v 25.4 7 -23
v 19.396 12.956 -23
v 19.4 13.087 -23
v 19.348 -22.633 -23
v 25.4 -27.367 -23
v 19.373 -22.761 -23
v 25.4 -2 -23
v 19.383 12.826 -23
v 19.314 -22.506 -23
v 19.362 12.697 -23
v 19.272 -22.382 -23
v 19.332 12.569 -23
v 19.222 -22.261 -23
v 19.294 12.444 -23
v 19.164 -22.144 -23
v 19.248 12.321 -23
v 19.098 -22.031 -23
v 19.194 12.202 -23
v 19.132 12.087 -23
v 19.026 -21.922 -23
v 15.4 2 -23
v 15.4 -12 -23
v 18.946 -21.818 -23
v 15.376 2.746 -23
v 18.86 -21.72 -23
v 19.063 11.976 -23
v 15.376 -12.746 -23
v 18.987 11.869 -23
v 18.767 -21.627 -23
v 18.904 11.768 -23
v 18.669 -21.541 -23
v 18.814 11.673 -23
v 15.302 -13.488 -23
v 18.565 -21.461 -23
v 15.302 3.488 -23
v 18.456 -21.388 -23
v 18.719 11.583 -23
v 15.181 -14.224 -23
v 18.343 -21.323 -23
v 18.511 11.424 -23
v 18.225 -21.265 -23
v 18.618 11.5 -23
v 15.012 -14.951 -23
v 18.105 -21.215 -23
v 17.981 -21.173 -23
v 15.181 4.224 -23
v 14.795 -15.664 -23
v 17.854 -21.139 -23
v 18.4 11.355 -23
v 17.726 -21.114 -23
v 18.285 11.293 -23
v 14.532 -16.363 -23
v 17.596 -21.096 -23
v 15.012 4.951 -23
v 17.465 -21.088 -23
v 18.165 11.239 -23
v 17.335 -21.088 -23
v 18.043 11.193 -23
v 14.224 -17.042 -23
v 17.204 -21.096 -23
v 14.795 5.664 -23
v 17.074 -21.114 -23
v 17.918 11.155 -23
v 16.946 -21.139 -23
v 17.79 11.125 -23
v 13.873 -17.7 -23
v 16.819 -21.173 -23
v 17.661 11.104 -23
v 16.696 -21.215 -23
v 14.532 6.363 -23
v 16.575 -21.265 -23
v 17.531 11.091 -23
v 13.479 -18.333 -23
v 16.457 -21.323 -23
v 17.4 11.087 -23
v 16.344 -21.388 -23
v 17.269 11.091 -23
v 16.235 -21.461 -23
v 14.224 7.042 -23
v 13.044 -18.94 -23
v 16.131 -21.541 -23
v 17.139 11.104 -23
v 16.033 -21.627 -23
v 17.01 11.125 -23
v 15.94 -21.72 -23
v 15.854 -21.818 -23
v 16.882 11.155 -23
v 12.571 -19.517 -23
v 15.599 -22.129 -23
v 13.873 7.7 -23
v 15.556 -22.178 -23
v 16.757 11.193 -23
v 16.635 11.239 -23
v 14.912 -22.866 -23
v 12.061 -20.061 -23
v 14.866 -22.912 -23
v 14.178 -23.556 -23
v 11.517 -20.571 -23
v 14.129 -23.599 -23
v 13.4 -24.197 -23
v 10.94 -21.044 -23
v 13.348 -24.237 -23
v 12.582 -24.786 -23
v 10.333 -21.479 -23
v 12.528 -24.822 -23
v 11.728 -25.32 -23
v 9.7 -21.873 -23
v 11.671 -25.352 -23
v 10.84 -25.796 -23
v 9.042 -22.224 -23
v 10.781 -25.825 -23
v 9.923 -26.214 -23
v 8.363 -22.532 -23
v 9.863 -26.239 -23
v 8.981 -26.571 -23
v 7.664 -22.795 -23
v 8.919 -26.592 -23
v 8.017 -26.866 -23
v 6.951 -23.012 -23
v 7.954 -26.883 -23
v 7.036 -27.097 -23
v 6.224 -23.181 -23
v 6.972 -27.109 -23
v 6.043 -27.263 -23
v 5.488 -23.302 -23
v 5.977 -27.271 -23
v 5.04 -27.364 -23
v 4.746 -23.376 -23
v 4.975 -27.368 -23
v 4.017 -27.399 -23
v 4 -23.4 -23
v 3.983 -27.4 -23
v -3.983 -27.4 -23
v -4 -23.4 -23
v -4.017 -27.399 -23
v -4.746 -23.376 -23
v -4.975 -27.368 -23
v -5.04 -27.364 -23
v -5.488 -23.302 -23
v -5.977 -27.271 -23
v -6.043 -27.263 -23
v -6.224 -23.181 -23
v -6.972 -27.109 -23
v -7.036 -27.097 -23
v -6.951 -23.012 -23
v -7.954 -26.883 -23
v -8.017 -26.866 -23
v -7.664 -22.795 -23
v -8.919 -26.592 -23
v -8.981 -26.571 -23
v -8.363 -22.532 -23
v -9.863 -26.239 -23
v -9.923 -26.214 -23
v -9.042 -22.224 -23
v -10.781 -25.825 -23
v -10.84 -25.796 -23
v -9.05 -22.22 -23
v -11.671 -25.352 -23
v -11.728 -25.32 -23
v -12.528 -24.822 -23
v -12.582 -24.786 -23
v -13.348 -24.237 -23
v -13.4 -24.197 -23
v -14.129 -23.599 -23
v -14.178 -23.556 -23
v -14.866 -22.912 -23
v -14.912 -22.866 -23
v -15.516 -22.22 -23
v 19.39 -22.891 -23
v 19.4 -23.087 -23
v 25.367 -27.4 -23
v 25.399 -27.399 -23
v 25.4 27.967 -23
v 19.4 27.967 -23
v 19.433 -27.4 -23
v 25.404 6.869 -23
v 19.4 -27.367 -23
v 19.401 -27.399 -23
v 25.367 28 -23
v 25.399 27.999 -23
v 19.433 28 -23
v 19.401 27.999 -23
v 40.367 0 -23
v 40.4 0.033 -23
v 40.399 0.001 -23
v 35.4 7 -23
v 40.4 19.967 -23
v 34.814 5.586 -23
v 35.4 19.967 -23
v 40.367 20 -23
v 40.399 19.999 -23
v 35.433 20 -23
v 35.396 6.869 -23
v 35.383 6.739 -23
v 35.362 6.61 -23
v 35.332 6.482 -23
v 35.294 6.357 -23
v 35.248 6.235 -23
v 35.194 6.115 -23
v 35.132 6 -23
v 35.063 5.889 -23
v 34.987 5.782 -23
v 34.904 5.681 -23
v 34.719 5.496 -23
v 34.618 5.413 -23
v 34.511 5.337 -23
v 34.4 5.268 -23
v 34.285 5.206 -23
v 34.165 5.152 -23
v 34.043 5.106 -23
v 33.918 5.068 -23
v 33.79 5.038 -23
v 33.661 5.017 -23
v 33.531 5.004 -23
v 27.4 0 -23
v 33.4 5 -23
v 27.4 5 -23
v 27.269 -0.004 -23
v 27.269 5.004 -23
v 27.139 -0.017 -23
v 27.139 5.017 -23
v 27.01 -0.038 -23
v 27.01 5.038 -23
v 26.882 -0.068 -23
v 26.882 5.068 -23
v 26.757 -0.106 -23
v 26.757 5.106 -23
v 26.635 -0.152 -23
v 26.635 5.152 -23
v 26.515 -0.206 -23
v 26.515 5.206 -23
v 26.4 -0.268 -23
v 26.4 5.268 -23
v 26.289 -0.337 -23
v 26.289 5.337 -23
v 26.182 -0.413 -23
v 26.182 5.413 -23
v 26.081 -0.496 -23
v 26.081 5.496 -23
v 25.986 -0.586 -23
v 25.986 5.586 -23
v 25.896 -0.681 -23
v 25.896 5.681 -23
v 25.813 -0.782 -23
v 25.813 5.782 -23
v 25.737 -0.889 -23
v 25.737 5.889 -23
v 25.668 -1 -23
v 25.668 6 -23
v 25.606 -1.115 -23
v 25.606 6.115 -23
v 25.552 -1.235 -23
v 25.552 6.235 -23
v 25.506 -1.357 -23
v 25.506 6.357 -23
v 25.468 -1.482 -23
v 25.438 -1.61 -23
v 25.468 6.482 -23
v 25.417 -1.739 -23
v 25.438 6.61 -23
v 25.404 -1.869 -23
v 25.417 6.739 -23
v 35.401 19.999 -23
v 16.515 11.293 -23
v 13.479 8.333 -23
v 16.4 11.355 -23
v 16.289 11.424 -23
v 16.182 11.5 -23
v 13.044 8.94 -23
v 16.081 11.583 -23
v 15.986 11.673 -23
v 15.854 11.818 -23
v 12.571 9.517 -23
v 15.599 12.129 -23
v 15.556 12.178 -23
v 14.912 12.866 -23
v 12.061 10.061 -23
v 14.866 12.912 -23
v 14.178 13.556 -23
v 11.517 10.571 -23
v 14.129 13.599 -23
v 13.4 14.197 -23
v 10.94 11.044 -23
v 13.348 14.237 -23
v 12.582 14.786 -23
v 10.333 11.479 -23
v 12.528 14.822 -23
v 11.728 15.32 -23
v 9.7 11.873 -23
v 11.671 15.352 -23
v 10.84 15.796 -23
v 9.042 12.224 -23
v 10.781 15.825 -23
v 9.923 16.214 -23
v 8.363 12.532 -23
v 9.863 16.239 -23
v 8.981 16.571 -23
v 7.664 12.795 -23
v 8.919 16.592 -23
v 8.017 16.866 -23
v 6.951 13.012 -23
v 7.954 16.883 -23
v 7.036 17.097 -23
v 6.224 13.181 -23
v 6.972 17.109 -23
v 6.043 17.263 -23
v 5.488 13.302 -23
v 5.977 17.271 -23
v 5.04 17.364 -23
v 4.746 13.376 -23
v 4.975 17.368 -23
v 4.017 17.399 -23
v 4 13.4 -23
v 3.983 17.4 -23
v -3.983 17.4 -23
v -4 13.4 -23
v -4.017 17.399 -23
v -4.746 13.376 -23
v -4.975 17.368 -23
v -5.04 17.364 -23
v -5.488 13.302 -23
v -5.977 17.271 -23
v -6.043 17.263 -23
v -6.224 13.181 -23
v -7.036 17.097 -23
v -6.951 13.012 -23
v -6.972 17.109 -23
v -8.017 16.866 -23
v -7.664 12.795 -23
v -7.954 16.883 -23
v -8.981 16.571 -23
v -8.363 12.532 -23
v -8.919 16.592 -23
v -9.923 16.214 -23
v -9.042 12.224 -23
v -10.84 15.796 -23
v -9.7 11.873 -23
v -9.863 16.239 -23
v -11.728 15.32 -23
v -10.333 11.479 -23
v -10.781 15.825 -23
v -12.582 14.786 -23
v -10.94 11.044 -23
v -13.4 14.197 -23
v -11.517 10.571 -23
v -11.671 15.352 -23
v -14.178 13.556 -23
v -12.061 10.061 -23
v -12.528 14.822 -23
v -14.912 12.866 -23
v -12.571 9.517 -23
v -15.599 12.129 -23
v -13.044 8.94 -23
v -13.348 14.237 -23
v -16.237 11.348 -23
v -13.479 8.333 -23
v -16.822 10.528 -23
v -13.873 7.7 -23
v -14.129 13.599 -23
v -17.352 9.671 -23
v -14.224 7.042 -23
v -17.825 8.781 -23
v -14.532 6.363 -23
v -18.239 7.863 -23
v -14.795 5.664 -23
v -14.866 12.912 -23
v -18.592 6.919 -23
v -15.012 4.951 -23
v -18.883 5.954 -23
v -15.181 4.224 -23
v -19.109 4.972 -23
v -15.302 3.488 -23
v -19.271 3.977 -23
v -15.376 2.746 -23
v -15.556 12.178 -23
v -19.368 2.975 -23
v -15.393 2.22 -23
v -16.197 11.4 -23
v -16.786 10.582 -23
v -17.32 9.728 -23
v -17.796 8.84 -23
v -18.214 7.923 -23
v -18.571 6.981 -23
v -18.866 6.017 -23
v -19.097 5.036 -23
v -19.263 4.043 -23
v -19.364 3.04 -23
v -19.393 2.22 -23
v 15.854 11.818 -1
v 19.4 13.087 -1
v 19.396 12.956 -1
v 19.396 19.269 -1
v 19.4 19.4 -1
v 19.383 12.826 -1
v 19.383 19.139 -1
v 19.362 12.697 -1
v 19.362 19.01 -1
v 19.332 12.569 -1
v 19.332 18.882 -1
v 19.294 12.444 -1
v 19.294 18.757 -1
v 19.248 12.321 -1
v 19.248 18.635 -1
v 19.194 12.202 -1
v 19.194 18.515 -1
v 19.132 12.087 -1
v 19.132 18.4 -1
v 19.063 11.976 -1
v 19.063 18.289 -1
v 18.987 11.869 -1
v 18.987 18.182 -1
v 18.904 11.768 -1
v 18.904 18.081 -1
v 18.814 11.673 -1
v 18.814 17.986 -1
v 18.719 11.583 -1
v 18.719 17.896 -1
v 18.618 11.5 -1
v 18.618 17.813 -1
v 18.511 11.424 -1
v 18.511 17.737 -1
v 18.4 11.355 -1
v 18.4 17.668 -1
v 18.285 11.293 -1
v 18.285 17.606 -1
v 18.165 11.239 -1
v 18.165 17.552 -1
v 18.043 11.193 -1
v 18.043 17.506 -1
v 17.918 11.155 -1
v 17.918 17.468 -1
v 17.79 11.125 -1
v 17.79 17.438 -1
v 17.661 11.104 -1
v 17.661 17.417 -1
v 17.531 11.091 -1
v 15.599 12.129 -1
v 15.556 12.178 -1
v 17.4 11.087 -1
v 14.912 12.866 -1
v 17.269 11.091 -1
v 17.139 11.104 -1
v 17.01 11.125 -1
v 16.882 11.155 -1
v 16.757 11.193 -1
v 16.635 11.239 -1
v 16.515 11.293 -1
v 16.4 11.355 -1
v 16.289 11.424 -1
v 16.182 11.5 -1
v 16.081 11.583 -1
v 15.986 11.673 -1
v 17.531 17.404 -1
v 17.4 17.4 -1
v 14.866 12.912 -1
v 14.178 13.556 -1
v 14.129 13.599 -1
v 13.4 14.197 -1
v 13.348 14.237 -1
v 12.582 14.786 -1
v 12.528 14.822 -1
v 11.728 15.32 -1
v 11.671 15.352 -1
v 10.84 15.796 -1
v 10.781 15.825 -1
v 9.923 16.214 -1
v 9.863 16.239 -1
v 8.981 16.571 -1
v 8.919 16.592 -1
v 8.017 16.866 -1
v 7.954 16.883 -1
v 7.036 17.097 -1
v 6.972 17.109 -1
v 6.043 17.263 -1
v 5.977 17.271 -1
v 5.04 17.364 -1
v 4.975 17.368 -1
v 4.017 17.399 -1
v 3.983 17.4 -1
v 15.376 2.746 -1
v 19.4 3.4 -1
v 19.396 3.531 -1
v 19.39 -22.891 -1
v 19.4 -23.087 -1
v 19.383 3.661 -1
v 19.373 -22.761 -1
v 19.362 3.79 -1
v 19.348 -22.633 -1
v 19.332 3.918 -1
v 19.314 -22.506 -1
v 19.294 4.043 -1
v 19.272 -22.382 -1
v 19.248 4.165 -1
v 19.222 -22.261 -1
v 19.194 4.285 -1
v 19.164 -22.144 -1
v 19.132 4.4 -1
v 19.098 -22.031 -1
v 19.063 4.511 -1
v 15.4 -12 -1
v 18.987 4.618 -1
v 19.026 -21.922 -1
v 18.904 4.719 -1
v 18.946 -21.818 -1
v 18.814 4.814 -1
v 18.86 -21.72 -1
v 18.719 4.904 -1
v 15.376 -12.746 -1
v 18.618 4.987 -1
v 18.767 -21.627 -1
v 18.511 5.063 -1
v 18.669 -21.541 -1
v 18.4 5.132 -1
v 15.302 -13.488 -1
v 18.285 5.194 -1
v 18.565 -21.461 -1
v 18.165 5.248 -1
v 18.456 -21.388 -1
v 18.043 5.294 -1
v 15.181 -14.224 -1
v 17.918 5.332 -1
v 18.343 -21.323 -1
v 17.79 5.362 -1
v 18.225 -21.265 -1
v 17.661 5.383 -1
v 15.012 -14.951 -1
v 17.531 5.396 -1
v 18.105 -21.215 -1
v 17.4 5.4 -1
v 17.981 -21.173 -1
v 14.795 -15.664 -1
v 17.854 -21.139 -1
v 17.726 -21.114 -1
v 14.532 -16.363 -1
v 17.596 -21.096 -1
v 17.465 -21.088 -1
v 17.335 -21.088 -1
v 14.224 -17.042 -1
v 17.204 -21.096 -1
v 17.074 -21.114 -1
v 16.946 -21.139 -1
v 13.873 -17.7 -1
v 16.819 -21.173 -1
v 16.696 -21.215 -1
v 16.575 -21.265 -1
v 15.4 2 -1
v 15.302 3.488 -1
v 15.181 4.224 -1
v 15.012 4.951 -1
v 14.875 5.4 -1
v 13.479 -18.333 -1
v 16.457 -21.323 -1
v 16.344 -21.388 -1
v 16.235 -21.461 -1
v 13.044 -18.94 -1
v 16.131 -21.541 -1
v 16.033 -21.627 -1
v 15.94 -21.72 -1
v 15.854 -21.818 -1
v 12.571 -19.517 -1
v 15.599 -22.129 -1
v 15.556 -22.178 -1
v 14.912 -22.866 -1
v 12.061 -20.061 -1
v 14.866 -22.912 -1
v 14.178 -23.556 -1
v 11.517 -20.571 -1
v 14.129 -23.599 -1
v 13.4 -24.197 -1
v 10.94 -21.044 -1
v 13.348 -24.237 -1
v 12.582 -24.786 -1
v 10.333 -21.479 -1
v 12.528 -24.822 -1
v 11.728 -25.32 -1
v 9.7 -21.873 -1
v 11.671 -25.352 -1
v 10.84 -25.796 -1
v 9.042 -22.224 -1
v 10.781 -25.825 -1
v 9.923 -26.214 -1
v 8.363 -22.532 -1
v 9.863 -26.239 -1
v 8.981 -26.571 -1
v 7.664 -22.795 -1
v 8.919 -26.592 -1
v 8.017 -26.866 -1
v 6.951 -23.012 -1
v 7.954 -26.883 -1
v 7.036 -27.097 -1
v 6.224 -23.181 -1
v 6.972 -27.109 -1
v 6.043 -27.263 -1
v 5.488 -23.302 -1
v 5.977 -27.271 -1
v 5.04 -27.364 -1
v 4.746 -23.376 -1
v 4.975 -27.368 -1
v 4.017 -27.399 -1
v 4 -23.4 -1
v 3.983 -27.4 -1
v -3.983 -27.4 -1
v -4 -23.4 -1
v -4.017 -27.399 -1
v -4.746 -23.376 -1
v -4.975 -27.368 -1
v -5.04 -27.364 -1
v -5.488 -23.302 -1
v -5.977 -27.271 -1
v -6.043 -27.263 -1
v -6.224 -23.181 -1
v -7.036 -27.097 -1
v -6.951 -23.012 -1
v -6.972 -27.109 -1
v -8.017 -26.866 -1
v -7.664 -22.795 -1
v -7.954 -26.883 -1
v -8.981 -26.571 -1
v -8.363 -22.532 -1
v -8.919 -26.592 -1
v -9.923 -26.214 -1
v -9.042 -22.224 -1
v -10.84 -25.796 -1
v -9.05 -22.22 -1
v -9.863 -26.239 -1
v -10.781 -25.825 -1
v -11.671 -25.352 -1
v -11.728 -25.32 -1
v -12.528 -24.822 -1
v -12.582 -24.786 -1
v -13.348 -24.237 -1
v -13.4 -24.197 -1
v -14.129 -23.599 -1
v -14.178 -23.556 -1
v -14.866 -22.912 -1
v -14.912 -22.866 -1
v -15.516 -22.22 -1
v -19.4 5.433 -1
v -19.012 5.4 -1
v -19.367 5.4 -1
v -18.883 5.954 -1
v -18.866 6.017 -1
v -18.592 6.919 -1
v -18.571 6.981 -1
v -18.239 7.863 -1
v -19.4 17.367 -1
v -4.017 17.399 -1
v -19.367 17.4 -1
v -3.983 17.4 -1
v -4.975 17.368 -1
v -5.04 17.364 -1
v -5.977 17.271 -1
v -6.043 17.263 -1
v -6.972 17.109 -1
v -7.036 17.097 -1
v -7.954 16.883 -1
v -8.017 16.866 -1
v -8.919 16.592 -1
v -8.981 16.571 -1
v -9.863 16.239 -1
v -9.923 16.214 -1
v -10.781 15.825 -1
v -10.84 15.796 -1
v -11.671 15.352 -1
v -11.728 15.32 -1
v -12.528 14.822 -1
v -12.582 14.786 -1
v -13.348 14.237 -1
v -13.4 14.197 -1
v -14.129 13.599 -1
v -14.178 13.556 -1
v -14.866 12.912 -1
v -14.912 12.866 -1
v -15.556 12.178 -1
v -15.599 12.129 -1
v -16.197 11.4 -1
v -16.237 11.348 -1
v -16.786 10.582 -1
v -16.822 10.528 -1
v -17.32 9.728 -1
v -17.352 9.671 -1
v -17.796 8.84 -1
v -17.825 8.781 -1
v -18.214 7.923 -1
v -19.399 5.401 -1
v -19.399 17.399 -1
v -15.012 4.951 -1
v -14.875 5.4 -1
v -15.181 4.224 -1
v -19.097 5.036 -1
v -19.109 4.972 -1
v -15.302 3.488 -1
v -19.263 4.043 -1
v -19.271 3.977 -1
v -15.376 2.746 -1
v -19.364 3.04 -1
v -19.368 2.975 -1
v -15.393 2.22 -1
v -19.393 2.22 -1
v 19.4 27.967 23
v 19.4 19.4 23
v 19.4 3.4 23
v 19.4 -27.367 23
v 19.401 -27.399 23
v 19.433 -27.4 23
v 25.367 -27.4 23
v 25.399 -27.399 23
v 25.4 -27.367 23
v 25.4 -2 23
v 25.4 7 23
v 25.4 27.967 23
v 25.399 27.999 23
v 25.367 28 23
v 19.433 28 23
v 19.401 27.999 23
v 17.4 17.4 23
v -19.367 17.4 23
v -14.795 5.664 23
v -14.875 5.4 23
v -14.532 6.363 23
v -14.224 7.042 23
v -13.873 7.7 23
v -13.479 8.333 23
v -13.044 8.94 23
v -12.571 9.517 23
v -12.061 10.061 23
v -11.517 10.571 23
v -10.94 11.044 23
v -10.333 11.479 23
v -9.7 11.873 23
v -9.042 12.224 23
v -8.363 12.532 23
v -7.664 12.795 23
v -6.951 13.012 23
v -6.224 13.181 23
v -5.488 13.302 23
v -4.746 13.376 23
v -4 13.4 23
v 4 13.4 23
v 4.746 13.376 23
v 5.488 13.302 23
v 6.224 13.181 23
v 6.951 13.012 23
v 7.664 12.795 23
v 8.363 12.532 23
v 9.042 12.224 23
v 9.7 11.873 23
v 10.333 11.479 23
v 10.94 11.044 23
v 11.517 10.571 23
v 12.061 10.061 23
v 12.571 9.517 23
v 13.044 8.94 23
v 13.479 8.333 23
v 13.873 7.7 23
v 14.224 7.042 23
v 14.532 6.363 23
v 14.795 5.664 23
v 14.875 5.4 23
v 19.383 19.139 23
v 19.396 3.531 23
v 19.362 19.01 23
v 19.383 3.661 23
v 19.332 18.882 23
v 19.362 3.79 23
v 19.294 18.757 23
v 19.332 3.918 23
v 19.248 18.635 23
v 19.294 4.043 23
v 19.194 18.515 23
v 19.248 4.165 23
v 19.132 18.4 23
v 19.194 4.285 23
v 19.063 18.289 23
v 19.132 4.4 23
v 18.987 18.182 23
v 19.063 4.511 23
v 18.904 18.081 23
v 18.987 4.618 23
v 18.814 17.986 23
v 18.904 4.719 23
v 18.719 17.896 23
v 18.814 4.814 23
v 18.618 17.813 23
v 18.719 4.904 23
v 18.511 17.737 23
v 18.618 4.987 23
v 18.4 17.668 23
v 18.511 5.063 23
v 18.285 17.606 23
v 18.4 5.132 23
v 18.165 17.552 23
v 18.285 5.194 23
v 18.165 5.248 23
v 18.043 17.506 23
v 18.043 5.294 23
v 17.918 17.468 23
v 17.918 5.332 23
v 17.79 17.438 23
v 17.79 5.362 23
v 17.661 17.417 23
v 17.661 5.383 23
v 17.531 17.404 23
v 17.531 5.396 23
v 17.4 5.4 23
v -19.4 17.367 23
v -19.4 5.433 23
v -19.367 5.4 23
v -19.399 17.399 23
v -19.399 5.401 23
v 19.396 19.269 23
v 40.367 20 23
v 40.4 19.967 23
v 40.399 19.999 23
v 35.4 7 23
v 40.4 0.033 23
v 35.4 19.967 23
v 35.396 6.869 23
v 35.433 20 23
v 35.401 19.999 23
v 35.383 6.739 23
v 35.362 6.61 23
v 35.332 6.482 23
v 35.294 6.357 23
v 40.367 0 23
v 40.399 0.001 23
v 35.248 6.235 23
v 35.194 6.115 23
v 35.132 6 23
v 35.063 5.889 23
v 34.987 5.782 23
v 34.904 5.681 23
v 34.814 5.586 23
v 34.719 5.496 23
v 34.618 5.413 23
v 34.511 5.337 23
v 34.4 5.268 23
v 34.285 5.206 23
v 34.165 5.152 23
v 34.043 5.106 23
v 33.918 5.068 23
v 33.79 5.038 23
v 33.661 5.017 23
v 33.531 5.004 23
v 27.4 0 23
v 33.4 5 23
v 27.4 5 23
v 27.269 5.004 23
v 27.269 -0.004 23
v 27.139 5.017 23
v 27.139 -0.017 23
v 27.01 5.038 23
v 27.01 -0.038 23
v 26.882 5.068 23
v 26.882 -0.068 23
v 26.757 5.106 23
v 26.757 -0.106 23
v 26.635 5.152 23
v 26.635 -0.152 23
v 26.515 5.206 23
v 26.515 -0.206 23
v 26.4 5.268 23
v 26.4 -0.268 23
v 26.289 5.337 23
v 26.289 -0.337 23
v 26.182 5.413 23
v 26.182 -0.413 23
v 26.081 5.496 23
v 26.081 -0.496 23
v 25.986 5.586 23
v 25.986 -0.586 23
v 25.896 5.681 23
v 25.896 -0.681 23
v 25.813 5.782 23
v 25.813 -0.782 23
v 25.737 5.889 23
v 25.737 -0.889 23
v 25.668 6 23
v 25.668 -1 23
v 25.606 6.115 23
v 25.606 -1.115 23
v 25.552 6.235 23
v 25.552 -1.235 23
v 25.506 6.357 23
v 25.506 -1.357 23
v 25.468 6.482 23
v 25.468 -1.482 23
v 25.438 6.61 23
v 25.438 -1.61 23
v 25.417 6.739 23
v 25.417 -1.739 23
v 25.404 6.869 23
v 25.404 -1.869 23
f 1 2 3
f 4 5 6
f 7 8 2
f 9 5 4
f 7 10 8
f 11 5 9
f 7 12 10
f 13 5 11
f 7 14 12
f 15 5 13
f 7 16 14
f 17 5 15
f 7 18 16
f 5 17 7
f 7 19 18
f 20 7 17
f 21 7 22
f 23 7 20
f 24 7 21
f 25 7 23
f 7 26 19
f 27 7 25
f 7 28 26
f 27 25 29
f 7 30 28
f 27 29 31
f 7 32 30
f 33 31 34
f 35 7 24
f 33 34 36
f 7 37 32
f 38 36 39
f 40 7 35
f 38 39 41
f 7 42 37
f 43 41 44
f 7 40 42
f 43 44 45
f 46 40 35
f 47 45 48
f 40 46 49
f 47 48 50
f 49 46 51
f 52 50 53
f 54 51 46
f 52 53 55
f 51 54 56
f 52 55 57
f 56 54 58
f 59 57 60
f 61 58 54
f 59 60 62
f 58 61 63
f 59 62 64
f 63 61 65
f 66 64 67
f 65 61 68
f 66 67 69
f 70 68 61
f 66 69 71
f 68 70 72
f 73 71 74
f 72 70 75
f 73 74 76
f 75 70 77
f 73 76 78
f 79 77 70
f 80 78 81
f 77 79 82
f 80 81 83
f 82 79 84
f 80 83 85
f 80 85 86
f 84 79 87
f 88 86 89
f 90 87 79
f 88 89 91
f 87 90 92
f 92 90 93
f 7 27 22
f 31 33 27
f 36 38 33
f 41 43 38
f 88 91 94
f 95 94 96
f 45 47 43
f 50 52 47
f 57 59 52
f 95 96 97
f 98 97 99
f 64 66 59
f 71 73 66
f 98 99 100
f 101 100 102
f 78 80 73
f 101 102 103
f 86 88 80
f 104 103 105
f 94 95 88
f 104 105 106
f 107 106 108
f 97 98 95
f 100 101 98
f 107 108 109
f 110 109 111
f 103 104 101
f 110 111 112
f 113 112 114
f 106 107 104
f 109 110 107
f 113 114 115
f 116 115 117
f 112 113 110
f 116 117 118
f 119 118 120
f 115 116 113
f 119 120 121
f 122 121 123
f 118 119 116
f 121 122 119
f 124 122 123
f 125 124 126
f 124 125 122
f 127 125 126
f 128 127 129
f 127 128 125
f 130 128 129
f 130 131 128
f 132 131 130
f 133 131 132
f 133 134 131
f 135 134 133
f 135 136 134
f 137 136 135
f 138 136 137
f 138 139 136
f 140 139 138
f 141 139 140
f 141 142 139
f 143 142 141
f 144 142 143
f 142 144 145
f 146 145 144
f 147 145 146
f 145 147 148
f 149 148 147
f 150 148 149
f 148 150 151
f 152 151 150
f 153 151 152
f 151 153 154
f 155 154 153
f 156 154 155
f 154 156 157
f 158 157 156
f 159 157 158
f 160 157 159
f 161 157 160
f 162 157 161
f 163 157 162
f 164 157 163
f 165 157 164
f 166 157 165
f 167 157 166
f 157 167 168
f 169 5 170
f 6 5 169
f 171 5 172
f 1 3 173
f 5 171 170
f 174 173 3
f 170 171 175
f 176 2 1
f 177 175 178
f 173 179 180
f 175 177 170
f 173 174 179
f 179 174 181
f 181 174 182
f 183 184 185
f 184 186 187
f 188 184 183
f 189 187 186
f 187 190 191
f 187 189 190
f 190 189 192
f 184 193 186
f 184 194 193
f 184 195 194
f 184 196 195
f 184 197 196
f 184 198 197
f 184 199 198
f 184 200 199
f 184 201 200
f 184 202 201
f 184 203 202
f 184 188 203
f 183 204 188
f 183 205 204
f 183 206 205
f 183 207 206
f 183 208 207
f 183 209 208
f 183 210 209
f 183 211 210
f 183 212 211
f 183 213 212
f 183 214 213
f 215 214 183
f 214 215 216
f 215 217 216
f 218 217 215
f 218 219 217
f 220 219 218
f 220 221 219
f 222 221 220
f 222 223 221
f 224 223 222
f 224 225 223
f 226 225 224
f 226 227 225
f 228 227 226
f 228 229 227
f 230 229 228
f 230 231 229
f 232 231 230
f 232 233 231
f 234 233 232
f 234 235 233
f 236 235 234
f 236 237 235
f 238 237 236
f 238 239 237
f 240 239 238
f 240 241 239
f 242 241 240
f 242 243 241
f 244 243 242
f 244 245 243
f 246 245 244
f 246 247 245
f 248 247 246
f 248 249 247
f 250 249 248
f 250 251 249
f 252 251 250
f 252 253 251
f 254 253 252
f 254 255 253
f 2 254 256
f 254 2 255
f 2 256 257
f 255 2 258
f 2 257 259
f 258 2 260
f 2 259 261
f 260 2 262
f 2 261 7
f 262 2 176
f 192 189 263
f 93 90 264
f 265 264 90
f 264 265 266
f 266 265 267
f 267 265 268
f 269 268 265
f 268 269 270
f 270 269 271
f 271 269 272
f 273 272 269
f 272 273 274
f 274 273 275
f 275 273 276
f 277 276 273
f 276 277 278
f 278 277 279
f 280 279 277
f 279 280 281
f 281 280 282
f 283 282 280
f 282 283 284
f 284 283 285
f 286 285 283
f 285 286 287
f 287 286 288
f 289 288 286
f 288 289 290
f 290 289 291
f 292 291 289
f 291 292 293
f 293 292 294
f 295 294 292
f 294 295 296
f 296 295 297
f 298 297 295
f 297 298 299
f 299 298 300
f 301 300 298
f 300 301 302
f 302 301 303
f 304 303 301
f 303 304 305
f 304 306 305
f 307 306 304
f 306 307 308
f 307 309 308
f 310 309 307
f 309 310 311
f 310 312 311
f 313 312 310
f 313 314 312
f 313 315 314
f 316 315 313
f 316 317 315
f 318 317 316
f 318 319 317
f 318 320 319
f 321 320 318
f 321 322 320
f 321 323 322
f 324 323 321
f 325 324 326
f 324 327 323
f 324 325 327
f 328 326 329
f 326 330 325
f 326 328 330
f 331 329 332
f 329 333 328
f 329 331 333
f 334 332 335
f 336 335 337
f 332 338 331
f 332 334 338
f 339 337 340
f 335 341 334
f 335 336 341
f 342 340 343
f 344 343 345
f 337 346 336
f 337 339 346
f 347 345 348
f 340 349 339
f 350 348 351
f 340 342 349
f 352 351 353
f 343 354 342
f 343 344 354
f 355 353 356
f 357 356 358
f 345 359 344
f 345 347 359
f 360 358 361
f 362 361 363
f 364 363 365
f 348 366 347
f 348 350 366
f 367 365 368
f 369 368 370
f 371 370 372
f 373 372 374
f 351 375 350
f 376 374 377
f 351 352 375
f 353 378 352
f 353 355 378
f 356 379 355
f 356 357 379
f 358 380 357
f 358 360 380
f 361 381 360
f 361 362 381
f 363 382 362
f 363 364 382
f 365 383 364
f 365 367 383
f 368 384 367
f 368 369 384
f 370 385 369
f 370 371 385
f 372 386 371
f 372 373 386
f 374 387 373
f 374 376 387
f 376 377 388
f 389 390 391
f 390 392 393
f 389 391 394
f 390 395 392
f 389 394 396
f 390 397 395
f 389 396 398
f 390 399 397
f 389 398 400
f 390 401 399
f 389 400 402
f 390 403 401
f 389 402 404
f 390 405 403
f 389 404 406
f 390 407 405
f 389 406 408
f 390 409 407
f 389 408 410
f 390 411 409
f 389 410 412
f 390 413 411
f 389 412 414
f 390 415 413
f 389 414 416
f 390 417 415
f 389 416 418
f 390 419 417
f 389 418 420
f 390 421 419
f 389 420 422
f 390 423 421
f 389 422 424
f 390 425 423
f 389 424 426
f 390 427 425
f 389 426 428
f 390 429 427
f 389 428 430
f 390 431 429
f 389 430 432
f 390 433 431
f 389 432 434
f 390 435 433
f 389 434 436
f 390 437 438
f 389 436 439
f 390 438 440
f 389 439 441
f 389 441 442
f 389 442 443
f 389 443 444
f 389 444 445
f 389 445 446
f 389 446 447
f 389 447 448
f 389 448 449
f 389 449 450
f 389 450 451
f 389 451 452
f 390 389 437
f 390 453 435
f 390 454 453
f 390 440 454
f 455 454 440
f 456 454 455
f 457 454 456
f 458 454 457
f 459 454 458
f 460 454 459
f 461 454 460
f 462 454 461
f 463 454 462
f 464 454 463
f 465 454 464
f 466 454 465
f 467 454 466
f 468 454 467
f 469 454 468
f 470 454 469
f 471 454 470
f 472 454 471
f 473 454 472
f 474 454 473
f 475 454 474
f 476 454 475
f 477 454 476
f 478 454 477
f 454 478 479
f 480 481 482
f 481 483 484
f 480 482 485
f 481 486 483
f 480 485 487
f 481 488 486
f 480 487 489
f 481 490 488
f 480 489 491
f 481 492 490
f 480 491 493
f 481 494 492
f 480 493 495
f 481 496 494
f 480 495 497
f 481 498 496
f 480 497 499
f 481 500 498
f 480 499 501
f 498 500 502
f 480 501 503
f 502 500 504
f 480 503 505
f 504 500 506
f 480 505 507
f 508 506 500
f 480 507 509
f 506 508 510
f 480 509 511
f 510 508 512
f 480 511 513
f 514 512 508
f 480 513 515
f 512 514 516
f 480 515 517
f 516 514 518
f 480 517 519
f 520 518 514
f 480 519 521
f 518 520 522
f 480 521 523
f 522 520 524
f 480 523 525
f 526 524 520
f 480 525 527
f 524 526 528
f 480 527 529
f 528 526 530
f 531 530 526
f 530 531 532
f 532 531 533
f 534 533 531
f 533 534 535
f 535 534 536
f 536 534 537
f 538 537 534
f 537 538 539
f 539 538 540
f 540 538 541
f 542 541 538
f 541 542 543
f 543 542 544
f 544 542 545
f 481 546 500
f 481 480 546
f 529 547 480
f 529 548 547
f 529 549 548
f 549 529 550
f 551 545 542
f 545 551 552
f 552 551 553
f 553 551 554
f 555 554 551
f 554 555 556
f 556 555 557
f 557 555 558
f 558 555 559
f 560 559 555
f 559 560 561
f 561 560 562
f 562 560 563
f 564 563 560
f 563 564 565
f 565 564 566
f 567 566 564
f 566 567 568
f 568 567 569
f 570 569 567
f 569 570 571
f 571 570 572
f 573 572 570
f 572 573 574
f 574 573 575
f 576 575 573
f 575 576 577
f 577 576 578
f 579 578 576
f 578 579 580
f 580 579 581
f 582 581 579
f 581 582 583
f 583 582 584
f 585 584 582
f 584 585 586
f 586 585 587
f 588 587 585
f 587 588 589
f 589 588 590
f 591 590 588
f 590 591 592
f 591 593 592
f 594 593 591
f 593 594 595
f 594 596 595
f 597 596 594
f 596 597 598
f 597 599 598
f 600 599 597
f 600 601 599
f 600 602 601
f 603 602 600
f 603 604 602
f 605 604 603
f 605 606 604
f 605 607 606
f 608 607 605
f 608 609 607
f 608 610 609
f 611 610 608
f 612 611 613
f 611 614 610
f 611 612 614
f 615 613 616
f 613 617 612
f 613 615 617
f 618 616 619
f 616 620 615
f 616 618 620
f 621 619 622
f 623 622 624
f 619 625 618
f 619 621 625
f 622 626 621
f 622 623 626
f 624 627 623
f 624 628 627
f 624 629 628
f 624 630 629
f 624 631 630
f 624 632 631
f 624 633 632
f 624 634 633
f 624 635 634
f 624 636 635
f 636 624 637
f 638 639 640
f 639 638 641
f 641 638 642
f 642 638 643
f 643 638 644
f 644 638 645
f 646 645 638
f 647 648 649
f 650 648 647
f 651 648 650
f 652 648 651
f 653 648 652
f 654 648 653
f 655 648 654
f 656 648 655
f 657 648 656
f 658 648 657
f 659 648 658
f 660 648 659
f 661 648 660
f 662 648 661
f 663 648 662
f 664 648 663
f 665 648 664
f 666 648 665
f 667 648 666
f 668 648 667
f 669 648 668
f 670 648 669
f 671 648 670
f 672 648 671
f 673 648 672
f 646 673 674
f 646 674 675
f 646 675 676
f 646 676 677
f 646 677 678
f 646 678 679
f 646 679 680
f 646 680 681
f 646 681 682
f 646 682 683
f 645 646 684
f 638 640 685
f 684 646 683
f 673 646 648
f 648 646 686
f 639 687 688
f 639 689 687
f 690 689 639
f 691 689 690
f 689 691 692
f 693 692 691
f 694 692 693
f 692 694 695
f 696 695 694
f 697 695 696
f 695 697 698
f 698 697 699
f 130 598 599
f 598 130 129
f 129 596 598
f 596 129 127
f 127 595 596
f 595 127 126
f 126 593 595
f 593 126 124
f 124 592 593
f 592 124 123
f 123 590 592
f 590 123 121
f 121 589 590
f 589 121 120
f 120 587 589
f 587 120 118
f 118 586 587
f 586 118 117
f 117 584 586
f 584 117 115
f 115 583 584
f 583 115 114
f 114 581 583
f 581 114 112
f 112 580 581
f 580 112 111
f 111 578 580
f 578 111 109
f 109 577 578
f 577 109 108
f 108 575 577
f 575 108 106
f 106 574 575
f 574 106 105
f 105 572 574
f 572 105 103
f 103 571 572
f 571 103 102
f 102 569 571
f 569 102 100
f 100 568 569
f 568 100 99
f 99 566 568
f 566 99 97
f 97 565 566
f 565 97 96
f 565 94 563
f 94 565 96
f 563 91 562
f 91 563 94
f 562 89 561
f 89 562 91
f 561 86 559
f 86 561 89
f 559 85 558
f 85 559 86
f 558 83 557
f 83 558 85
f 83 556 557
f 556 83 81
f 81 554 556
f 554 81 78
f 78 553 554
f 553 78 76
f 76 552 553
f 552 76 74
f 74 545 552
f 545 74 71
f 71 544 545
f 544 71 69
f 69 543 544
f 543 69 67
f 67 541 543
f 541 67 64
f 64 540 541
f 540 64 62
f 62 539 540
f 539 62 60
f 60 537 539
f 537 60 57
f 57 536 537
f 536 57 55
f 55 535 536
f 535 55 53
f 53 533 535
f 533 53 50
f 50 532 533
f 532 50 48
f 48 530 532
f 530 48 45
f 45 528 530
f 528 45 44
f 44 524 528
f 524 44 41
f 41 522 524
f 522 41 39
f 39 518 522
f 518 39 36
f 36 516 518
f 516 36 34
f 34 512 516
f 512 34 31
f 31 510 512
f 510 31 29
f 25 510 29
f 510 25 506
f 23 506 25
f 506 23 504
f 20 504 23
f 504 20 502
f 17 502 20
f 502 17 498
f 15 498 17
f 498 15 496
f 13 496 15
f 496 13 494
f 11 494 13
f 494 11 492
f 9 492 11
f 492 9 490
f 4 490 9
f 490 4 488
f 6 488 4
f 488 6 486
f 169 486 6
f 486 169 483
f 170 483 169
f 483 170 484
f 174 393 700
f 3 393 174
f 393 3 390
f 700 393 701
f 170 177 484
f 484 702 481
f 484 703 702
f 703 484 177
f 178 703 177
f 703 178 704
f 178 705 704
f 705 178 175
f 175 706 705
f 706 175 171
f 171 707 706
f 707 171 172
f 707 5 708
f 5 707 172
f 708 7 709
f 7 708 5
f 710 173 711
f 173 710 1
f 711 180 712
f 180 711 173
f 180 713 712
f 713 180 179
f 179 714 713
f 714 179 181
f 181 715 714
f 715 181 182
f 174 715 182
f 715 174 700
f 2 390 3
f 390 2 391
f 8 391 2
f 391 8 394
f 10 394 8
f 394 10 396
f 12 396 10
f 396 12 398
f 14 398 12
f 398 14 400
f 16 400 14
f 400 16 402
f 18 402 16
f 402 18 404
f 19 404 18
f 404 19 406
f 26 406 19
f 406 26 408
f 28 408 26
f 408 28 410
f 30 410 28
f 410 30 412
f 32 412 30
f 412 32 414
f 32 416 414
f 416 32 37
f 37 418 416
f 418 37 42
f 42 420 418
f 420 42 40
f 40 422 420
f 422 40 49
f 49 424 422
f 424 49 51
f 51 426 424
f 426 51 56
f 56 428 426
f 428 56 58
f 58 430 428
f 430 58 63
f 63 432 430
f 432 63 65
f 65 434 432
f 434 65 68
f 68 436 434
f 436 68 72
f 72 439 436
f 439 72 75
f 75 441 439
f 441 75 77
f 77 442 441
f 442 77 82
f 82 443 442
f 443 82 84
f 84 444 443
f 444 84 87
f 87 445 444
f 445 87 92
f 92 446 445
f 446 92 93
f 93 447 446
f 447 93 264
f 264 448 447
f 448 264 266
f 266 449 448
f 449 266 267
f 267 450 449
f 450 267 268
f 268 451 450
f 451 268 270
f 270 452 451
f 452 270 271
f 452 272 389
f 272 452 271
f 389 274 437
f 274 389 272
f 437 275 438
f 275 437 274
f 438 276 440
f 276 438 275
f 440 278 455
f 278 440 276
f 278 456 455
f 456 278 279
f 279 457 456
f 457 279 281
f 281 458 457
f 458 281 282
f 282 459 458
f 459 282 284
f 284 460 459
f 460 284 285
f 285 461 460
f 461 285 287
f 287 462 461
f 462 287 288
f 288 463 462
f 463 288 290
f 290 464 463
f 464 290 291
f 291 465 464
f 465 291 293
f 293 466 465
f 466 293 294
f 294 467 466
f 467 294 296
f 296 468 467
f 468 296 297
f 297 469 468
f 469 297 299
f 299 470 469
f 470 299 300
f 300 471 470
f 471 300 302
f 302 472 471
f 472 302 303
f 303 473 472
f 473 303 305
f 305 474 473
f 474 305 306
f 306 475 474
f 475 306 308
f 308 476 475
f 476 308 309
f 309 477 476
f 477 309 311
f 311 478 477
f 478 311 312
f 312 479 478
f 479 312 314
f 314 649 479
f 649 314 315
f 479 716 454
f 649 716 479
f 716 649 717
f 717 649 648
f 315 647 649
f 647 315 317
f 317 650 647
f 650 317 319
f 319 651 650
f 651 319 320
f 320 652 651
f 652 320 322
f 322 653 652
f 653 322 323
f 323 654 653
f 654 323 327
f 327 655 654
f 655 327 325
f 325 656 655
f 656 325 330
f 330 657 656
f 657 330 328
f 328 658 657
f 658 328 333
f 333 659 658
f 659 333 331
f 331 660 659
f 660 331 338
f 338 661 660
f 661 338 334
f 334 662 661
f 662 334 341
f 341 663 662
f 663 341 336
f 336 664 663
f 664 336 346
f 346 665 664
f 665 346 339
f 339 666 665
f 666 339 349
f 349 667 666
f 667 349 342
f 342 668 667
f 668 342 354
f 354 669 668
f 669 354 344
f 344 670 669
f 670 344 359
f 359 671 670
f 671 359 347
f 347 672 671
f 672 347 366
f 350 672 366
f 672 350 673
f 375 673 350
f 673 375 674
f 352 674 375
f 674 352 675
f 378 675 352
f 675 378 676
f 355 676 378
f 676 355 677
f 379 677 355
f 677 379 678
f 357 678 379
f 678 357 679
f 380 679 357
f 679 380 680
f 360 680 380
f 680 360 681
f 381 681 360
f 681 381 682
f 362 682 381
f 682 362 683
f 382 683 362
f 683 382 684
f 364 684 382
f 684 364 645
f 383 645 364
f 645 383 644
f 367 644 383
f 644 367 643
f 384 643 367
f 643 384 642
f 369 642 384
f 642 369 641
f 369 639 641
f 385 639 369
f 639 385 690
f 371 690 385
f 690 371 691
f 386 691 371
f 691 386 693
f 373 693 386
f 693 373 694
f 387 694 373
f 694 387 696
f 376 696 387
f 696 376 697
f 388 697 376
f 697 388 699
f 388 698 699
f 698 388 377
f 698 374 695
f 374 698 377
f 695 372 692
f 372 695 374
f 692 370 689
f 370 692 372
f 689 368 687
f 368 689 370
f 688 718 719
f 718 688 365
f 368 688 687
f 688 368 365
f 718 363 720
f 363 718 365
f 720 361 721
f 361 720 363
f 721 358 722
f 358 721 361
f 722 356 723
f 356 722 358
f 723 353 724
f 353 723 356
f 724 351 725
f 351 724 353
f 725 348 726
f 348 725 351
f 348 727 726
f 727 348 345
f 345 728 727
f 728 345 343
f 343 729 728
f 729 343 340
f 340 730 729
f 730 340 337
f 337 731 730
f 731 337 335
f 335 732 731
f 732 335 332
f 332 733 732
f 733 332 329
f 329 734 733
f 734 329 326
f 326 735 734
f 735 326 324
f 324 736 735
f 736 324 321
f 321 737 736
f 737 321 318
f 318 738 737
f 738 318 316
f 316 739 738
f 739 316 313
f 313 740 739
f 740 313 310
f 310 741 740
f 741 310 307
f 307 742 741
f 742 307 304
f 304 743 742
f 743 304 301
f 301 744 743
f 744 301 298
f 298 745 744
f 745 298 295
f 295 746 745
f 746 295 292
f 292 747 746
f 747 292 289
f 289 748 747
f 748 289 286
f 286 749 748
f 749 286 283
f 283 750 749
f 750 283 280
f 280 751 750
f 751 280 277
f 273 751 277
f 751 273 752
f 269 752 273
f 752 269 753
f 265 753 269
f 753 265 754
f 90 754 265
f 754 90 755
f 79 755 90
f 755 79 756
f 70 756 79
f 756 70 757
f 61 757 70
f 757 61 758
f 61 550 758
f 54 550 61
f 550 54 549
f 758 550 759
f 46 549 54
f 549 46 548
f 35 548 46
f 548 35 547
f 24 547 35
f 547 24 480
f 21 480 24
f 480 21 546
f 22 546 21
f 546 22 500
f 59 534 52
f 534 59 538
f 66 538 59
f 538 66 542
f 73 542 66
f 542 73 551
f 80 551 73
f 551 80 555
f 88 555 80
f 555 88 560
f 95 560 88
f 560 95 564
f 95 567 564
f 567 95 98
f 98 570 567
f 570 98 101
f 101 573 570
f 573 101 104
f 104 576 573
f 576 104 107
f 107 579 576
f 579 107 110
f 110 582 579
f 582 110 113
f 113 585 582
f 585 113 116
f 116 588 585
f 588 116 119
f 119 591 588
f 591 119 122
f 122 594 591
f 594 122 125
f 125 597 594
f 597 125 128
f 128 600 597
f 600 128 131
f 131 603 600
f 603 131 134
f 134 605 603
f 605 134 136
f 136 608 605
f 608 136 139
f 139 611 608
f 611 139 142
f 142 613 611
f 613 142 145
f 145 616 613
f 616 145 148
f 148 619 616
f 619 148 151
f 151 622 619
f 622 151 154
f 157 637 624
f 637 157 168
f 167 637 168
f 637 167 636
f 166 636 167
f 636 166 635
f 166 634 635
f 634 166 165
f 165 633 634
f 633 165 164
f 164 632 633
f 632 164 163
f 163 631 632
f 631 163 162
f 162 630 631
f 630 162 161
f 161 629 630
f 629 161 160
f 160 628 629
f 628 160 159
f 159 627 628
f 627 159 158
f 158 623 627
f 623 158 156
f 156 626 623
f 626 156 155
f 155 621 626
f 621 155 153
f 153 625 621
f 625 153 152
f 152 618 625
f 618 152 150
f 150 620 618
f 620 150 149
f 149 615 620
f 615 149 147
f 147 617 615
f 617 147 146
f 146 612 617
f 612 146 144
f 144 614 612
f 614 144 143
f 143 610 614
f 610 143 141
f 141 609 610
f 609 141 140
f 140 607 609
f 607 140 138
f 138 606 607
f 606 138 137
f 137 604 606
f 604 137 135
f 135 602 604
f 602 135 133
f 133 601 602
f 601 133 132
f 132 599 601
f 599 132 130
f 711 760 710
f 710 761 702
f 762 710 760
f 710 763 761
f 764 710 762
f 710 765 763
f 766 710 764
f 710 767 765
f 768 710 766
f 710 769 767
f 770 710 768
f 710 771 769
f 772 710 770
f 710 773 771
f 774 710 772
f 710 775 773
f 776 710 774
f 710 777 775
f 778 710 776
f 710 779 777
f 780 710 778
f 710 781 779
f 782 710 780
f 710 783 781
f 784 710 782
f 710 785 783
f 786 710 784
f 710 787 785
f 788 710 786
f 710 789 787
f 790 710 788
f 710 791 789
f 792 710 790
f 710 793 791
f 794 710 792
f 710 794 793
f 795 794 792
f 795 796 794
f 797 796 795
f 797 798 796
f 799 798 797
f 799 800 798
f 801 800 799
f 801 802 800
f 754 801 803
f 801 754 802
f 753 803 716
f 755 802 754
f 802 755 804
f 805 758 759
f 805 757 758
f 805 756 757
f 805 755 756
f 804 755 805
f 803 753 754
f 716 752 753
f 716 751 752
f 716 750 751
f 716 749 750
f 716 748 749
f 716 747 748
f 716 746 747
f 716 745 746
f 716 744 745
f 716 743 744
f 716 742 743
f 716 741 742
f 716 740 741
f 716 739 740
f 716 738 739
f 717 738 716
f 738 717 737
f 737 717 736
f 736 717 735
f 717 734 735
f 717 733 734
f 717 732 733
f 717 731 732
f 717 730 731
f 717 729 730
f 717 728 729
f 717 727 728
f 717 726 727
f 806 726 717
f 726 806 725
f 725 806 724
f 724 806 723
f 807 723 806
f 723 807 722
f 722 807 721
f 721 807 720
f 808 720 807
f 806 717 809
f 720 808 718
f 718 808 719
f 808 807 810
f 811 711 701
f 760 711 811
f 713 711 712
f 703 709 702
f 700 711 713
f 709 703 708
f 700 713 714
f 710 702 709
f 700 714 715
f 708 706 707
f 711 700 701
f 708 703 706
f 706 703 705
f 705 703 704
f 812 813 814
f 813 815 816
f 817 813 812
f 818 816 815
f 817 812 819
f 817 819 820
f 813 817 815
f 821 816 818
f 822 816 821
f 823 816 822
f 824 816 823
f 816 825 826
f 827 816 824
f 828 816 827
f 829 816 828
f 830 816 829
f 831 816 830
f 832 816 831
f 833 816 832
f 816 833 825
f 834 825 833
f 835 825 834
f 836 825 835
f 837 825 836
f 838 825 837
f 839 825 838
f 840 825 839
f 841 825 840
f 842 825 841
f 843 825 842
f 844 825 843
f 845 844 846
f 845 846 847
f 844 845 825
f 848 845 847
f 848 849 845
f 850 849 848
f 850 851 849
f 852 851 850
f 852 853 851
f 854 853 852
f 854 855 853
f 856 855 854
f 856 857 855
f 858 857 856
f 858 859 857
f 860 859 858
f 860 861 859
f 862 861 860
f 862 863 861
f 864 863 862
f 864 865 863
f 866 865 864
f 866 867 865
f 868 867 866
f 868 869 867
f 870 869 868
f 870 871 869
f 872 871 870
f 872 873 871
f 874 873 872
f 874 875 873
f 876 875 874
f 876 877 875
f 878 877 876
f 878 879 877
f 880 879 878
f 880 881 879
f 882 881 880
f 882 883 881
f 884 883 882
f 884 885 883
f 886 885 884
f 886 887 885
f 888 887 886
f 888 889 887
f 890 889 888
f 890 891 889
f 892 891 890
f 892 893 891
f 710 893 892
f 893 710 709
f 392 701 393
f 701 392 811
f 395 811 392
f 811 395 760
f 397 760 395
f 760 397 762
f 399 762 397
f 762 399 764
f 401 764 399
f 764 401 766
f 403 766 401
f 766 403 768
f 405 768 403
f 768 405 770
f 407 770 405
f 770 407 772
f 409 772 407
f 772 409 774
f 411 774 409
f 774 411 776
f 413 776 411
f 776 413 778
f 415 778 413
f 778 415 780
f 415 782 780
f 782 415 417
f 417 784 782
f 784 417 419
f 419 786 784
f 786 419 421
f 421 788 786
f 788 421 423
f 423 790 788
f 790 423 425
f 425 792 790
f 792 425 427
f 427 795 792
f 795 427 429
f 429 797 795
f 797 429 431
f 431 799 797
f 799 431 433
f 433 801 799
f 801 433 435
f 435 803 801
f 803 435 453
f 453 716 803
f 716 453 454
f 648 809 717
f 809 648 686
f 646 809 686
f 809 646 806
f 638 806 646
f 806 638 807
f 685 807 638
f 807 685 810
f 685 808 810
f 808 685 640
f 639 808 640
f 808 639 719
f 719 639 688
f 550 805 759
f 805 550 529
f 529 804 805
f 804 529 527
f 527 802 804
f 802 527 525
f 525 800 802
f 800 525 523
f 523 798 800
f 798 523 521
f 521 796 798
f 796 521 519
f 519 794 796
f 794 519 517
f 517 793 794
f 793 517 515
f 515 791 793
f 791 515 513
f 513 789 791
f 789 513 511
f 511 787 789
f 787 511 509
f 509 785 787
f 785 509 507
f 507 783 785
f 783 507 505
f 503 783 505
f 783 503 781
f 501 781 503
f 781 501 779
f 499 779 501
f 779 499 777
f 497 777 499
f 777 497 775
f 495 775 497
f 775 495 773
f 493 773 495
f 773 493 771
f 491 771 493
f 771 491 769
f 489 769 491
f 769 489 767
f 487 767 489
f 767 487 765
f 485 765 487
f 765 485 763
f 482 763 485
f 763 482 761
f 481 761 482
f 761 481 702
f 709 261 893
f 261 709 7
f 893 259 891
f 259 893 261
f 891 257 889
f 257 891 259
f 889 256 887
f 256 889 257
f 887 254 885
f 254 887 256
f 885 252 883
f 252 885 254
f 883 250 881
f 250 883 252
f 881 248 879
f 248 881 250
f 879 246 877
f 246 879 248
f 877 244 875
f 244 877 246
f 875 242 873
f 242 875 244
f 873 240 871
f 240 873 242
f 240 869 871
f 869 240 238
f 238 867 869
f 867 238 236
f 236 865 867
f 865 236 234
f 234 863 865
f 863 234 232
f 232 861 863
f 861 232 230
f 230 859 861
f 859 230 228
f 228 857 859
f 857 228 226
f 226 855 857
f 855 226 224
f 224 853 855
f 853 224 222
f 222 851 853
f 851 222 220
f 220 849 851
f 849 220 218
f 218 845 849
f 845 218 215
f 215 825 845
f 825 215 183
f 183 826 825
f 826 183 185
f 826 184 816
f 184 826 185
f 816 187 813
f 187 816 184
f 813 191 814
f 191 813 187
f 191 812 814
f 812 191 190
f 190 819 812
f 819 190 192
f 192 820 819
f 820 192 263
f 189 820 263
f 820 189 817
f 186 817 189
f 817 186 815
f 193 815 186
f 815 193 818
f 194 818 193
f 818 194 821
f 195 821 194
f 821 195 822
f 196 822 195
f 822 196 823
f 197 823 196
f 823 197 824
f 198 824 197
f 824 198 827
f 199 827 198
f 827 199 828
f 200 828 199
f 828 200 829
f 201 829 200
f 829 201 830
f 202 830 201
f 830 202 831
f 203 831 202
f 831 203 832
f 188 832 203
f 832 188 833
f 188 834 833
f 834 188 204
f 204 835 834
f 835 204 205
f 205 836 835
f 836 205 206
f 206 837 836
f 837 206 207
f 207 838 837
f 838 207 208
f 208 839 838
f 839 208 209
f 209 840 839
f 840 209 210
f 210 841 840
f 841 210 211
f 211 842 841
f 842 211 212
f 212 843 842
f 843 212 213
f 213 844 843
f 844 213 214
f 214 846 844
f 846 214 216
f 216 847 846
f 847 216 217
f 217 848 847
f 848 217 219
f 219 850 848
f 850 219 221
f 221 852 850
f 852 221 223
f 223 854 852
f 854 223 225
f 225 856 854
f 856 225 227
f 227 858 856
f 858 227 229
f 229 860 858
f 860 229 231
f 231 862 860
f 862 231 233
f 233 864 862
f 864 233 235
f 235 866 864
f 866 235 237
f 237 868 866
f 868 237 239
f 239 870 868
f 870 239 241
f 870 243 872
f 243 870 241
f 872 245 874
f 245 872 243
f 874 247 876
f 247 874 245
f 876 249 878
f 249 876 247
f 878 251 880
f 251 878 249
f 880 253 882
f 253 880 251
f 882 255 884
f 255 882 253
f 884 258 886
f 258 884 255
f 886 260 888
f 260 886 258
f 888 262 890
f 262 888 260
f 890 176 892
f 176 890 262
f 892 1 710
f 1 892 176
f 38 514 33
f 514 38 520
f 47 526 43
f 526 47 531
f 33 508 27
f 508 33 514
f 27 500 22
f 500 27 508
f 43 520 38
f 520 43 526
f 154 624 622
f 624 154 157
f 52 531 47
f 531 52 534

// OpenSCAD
// =====================================================================
//  Fit checks. Nothing here is printable -- they exist so a clearance
//  mistake shows up on screen rather than on the bed.
//
//    make check
//
//  Every check must come out EMPTY. Anything solid is an interference.
// =====================================================================

include <stroller_clip.scad>

check = "seated";   // [seated, raised, release, mount, lift]

// --- the clip against the bar ---------------------------------------

// Seated and locked: the bar sits at the top of the slot, under the
// cap. Contact, but no interference.
module check_seated() {
    intersection() { clip(); handle_bar(); }
}

// Raised by slide_travel: the bar drops to the bottom of the slot and
// lines up with the mouth. If this is not empty the clip cannot be
// lifted far enough to come off.
module check_raised() {
    intersection() {
        translate([0, slide_travel, 0]) clip();
        handle_bar();
    }
}

// Pulling the raised clip off sideways. The bar has to squeeze through
// the mouth, so a band of interference across the mouth is EXPECTED --
// that is the click. What must be empty is the cap: if the cap fouls
// the bar on the way out, the clip is trapped.
//
// So this checks the cap station alone, not the jaw.
module check_release() {
    intersection() {
        for (dx = [0 : 2 : bore_w + wall + 6])
            translate([dx, slide_travel, 0])
                translate([0, 0, cap_z0]) linear_extrude(cap_len) cap_2d();
        handle_bar();
    }
}

// --- the attachment against the clip --------------------------------

module check_mount() { intersection() { clip(); cupholder(); } }

// Stepping the attachment straight up off the hook traces the whole
// removal path. Stepped union rather than hull() -- these shapes are
// non-convex, and the convex hull of two poses sweeps through material
// the part never actually occupies.
lift_mm   = 26;
lift_step = 1;

module check_lift() {
    intersection() {
        clip();
        for (dy = [0 : lift_step : lift_mm])
            translate([0, dy, 0]) cupholder();
    }
}

if      (check == "seated")  check_seated();
else if (check == "raised")  check_raised();
else if (check == "release") check_release();
else if (check == "mount")   check_mount();
else if (check == "lift")    check_lift();
